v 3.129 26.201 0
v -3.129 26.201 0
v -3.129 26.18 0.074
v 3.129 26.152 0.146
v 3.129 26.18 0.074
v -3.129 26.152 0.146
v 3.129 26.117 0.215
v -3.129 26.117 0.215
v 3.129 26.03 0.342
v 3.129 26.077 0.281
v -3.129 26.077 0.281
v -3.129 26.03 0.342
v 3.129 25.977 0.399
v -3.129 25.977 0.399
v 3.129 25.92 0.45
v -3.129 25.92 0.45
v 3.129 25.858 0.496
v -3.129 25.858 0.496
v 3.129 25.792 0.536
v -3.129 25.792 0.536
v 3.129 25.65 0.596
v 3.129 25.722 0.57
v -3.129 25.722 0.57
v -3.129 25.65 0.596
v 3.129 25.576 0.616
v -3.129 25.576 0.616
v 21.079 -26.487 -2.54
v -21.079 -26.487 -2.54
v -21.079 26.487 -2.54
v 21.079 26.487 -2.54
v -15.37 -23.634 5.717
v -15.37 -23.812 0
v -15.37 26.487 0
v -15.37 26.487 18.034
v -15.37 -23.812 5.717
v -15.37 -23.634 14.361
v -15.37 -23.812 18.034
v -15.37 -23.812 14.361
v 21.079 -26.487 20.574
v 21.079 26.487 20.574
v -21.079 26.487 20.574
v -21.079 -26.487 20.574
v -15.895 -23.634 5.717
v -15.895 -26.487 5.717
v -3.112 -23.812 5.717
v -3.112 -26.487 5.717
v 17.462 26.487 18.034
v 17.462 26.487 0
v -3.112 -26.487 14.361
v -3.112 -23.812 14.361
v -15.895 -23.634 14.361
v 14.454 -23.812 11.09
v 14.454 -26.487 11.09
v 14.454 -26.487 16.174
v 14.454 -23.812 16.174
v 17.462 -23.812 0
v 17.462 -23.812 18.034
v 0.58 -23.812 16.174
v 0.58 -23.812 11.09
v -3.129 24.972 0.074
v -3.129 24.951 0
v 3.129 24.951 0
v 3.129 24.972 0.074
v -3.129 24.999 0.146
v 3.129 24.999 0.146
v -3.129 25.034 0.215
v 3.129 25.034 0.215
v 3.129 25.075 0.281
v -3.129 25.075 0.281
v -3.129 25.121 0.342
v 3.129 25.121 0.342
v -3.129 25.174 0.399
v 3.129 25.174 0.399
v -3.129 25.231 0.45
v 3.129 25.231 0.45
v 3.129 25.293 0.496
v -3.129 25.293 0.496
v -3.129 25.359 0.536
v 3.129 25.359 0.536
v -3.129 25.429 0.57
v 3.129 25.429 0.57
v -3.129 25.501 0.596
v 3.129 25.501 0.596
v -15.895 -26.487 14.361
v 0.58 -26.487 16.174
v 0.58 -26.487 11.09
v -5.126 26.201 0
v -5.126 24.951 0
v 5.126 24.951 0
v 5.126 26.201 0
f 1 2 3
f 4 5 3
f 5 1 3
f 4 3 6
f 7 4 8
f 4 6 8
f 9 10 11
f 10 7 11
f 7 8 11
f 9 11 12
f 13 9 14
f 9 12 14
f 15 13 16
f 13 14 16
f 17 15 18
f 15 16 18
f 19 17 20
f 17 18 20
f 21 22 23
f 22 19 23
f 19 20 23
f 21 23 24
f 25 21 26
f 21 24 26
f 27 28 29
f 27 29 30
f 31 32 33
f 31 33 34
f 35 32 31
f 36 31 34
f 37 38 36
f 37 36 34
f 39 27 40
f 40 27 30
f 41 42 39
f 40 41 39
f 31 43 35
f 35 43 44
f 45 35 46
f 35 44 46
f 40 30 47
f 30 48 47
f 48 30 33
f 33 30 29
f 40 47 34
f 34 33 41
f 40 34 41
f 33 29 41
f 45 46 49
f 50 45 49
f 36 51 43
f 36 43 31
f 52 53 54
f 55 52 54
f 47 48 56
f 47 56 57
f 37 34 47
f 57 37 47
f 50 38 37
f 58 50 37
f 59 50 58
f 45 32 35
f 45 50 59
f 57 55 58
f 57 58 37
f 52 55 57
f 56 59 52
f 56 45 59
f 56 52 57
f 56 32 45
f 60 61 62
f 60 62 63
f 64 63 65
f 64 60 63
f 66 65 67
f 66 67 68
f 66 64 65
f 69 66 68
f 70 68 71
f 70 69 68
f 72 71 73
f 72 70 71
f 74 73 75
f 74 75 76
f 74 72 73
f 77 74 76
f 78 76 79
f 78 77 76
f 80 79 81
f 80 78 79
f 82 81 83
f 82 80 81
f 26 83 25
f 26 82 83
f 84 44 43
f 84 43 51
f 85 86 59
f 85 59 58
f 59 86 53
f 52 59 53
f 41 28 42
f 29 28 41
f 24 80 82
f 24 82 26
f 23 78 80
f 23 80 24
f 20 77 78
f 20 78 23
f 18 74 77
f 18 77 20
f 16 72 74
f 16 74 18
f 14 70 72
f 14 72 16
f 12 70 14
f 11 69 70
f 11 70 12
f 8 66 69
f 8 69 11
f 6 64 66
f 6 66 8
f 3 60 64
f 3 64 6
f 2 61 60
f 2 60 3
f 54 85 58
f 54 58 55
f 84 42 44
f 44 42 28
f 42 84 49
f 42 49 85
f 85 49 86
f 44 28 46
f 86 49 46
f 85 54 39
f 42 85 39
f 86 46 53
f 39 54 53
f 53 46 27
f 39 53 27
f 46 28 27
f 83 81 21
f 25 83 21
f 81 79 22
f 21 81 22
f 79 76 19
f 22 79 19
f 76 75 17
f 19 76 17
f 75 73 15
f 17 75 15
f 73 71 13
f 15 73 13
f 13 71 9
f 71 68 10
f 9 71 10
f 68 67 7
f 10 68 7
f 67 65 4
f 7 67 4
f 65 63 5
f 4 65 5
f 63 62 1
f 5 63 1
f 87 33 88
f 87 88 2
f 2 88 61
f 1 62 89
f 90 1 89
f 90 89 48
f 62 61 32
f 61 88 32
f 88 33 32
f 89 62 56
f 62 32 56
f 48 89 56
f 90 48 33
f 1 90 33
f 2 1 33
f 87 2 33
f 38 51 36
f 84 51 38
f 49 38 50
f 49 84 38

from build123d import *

# Parameters (mm, degrees)
F0_W         = 42.1587601304
F0_H         = 52.9734008014
F0_W_2       = 34.925
F0_H_2       = 47.625
F1_DEPTH     = 18.034
F2_DEPTH     = 2.54
F3_W         = 34.925
F3_H         = 18.034
F2_FACE_W    = 42.1587601304
F2_FACE_H    = 20.574
F4_DEPTH     = 10.32974
F5_W         = 42.1587601304
F5_H         = 52.9734008014
F6_DEPTH     = 2.54
F7_W         = 13.8736660592
F7_H         = 5.0836820155
F8_DEPTH     = 25.4
F9_W         = 6.2576979399
F9_H         = 1.2498646975
F10_DEPTH    = 0.635
F11_T1_DEPTH = 10.2510766125
F12_DEPTH    = 2.0923395641
F13_W        = 12.7831122372
F13_H        = 8.6434278637
F14_DEPTH    = 2.8529665433


# Not quite as in the source:
# - a fillet or chamfer that OpenCascade refuses, or shapes differently, is made with other operations: its cross-section is extruded or revolved along the edge and cut away or added


with BuildPart() as f1:
    # F0 (on Top) → F1 (new body)
    with BuildSketch(Plane.XY):
        Rectangle(F0_W, F0_H)
        Rectangle(F0_W_2, F0_H_2, mode=Mode.SUBTRACT)
    extrude(amount=F1_DEPTH)

    # F0 (on Top) → F2 (join)
    with BuildSketch(Plane.XY):
        Rectangle(F0_W, F0_H)
        Rectangle(F0_W_2, F0_H_2, mode=Mode.SUBTRACT)
        Rectangle(F0_W_2, F0_H_2)
    extrude(amount=-F2_DEPTH)

    # F3 (on face) + F2_face (on face) → F4 (cut)
    with BuildSketch(Plane.XZ.offset(-23.8125)):
        with Locations((0, 9.017)):
            Rectangle(F3_W, F3_H)
    with BuildSketch(Plane(origin=(0, 26.4867004007, 7.747), x_dir=(-1, 0, 0), z_dir=(0, 1, 0))):
        Rectangle(F2_FACE_W, F2_FACE_H)
    extrude(amount=-F4_DEPTH, dir=(0, -1, 0), mode=Mode.SUBTRACT)

    # F5 (on face) → F6 (join)
    with BuildSketch(Plane.XY.offset(18.034)):
        Rectangle(F5_W, F5_H)
    extrude(amount=F6_DEPTH)

    # F7 (on face) → F8 (cut)
    with BuildSketch(Plane.XZ.offset(26.4867004007)):
        with Locations((7.517300779, 13.6317610741)):
            Rectangle(F7_W, F7_H)
    extrude(amount=-F8_DEPTH, mode=Mode.SUBTRACT)

    # F9 (on face) → F10 (join)
    with BuildSketch(Plane.XY):
        with Locations((0, 25.5755782127)):
            Rectangle(F9_W, F9_H)
    extrude(amount=F10_DEPTH)

    # F11: fillet of radius 0.8197700228 on 2 edges, made by hand

    # F11_s2 → F11_t1 (cut)
    with BuildSketch(Plane.YZ.offset(-5.1255383063)):
        with BuildLine():
            ThreePointArc((26.2005105615, 0), (25.9120083094, 0.4569042778), (25.4018348269, 0.635))
            Line((25.4018348269, 0.635), (26.2005105615, 0.635))
            Line((26.2005105615, 0.635), (26.2005105615, 0))
        make_face()
        with BuildLine():
            ThreePointArc((24.950645864, 0), (25.2391481161, 0.4569042778), (25.7493215985, 0.635))
            Line((25.7493215985, 0.635), (24.950645864, 0.635))
            Line((24.950645864, 0.635), (24.950645864, 0))
        make_face()
    extrude(amount=F11_T1_DEPTH, mode=Mode.SUBTRACT)

    # F12 (add): a face of the model
    f12_faces = [f1.faces().sort_by_distance(p)[0] for p in [
        (-17.4625, 1.3371002004, 9.017),
    ]]
    extrude(f12_faces, amount=F12_DEPTH)

    # F13 (on face) → F14 (cut)
    with BuildSketch(Plane.XZ.offset(26.4867004007)):
        with Locations((-9.5031157834, 10.0388908759)):
            Rectangle(F13_W, F13_H)
    extrude(amount=-F14_DEPTH, mode=Mode.SUBTRACT)


solid = f1.part
